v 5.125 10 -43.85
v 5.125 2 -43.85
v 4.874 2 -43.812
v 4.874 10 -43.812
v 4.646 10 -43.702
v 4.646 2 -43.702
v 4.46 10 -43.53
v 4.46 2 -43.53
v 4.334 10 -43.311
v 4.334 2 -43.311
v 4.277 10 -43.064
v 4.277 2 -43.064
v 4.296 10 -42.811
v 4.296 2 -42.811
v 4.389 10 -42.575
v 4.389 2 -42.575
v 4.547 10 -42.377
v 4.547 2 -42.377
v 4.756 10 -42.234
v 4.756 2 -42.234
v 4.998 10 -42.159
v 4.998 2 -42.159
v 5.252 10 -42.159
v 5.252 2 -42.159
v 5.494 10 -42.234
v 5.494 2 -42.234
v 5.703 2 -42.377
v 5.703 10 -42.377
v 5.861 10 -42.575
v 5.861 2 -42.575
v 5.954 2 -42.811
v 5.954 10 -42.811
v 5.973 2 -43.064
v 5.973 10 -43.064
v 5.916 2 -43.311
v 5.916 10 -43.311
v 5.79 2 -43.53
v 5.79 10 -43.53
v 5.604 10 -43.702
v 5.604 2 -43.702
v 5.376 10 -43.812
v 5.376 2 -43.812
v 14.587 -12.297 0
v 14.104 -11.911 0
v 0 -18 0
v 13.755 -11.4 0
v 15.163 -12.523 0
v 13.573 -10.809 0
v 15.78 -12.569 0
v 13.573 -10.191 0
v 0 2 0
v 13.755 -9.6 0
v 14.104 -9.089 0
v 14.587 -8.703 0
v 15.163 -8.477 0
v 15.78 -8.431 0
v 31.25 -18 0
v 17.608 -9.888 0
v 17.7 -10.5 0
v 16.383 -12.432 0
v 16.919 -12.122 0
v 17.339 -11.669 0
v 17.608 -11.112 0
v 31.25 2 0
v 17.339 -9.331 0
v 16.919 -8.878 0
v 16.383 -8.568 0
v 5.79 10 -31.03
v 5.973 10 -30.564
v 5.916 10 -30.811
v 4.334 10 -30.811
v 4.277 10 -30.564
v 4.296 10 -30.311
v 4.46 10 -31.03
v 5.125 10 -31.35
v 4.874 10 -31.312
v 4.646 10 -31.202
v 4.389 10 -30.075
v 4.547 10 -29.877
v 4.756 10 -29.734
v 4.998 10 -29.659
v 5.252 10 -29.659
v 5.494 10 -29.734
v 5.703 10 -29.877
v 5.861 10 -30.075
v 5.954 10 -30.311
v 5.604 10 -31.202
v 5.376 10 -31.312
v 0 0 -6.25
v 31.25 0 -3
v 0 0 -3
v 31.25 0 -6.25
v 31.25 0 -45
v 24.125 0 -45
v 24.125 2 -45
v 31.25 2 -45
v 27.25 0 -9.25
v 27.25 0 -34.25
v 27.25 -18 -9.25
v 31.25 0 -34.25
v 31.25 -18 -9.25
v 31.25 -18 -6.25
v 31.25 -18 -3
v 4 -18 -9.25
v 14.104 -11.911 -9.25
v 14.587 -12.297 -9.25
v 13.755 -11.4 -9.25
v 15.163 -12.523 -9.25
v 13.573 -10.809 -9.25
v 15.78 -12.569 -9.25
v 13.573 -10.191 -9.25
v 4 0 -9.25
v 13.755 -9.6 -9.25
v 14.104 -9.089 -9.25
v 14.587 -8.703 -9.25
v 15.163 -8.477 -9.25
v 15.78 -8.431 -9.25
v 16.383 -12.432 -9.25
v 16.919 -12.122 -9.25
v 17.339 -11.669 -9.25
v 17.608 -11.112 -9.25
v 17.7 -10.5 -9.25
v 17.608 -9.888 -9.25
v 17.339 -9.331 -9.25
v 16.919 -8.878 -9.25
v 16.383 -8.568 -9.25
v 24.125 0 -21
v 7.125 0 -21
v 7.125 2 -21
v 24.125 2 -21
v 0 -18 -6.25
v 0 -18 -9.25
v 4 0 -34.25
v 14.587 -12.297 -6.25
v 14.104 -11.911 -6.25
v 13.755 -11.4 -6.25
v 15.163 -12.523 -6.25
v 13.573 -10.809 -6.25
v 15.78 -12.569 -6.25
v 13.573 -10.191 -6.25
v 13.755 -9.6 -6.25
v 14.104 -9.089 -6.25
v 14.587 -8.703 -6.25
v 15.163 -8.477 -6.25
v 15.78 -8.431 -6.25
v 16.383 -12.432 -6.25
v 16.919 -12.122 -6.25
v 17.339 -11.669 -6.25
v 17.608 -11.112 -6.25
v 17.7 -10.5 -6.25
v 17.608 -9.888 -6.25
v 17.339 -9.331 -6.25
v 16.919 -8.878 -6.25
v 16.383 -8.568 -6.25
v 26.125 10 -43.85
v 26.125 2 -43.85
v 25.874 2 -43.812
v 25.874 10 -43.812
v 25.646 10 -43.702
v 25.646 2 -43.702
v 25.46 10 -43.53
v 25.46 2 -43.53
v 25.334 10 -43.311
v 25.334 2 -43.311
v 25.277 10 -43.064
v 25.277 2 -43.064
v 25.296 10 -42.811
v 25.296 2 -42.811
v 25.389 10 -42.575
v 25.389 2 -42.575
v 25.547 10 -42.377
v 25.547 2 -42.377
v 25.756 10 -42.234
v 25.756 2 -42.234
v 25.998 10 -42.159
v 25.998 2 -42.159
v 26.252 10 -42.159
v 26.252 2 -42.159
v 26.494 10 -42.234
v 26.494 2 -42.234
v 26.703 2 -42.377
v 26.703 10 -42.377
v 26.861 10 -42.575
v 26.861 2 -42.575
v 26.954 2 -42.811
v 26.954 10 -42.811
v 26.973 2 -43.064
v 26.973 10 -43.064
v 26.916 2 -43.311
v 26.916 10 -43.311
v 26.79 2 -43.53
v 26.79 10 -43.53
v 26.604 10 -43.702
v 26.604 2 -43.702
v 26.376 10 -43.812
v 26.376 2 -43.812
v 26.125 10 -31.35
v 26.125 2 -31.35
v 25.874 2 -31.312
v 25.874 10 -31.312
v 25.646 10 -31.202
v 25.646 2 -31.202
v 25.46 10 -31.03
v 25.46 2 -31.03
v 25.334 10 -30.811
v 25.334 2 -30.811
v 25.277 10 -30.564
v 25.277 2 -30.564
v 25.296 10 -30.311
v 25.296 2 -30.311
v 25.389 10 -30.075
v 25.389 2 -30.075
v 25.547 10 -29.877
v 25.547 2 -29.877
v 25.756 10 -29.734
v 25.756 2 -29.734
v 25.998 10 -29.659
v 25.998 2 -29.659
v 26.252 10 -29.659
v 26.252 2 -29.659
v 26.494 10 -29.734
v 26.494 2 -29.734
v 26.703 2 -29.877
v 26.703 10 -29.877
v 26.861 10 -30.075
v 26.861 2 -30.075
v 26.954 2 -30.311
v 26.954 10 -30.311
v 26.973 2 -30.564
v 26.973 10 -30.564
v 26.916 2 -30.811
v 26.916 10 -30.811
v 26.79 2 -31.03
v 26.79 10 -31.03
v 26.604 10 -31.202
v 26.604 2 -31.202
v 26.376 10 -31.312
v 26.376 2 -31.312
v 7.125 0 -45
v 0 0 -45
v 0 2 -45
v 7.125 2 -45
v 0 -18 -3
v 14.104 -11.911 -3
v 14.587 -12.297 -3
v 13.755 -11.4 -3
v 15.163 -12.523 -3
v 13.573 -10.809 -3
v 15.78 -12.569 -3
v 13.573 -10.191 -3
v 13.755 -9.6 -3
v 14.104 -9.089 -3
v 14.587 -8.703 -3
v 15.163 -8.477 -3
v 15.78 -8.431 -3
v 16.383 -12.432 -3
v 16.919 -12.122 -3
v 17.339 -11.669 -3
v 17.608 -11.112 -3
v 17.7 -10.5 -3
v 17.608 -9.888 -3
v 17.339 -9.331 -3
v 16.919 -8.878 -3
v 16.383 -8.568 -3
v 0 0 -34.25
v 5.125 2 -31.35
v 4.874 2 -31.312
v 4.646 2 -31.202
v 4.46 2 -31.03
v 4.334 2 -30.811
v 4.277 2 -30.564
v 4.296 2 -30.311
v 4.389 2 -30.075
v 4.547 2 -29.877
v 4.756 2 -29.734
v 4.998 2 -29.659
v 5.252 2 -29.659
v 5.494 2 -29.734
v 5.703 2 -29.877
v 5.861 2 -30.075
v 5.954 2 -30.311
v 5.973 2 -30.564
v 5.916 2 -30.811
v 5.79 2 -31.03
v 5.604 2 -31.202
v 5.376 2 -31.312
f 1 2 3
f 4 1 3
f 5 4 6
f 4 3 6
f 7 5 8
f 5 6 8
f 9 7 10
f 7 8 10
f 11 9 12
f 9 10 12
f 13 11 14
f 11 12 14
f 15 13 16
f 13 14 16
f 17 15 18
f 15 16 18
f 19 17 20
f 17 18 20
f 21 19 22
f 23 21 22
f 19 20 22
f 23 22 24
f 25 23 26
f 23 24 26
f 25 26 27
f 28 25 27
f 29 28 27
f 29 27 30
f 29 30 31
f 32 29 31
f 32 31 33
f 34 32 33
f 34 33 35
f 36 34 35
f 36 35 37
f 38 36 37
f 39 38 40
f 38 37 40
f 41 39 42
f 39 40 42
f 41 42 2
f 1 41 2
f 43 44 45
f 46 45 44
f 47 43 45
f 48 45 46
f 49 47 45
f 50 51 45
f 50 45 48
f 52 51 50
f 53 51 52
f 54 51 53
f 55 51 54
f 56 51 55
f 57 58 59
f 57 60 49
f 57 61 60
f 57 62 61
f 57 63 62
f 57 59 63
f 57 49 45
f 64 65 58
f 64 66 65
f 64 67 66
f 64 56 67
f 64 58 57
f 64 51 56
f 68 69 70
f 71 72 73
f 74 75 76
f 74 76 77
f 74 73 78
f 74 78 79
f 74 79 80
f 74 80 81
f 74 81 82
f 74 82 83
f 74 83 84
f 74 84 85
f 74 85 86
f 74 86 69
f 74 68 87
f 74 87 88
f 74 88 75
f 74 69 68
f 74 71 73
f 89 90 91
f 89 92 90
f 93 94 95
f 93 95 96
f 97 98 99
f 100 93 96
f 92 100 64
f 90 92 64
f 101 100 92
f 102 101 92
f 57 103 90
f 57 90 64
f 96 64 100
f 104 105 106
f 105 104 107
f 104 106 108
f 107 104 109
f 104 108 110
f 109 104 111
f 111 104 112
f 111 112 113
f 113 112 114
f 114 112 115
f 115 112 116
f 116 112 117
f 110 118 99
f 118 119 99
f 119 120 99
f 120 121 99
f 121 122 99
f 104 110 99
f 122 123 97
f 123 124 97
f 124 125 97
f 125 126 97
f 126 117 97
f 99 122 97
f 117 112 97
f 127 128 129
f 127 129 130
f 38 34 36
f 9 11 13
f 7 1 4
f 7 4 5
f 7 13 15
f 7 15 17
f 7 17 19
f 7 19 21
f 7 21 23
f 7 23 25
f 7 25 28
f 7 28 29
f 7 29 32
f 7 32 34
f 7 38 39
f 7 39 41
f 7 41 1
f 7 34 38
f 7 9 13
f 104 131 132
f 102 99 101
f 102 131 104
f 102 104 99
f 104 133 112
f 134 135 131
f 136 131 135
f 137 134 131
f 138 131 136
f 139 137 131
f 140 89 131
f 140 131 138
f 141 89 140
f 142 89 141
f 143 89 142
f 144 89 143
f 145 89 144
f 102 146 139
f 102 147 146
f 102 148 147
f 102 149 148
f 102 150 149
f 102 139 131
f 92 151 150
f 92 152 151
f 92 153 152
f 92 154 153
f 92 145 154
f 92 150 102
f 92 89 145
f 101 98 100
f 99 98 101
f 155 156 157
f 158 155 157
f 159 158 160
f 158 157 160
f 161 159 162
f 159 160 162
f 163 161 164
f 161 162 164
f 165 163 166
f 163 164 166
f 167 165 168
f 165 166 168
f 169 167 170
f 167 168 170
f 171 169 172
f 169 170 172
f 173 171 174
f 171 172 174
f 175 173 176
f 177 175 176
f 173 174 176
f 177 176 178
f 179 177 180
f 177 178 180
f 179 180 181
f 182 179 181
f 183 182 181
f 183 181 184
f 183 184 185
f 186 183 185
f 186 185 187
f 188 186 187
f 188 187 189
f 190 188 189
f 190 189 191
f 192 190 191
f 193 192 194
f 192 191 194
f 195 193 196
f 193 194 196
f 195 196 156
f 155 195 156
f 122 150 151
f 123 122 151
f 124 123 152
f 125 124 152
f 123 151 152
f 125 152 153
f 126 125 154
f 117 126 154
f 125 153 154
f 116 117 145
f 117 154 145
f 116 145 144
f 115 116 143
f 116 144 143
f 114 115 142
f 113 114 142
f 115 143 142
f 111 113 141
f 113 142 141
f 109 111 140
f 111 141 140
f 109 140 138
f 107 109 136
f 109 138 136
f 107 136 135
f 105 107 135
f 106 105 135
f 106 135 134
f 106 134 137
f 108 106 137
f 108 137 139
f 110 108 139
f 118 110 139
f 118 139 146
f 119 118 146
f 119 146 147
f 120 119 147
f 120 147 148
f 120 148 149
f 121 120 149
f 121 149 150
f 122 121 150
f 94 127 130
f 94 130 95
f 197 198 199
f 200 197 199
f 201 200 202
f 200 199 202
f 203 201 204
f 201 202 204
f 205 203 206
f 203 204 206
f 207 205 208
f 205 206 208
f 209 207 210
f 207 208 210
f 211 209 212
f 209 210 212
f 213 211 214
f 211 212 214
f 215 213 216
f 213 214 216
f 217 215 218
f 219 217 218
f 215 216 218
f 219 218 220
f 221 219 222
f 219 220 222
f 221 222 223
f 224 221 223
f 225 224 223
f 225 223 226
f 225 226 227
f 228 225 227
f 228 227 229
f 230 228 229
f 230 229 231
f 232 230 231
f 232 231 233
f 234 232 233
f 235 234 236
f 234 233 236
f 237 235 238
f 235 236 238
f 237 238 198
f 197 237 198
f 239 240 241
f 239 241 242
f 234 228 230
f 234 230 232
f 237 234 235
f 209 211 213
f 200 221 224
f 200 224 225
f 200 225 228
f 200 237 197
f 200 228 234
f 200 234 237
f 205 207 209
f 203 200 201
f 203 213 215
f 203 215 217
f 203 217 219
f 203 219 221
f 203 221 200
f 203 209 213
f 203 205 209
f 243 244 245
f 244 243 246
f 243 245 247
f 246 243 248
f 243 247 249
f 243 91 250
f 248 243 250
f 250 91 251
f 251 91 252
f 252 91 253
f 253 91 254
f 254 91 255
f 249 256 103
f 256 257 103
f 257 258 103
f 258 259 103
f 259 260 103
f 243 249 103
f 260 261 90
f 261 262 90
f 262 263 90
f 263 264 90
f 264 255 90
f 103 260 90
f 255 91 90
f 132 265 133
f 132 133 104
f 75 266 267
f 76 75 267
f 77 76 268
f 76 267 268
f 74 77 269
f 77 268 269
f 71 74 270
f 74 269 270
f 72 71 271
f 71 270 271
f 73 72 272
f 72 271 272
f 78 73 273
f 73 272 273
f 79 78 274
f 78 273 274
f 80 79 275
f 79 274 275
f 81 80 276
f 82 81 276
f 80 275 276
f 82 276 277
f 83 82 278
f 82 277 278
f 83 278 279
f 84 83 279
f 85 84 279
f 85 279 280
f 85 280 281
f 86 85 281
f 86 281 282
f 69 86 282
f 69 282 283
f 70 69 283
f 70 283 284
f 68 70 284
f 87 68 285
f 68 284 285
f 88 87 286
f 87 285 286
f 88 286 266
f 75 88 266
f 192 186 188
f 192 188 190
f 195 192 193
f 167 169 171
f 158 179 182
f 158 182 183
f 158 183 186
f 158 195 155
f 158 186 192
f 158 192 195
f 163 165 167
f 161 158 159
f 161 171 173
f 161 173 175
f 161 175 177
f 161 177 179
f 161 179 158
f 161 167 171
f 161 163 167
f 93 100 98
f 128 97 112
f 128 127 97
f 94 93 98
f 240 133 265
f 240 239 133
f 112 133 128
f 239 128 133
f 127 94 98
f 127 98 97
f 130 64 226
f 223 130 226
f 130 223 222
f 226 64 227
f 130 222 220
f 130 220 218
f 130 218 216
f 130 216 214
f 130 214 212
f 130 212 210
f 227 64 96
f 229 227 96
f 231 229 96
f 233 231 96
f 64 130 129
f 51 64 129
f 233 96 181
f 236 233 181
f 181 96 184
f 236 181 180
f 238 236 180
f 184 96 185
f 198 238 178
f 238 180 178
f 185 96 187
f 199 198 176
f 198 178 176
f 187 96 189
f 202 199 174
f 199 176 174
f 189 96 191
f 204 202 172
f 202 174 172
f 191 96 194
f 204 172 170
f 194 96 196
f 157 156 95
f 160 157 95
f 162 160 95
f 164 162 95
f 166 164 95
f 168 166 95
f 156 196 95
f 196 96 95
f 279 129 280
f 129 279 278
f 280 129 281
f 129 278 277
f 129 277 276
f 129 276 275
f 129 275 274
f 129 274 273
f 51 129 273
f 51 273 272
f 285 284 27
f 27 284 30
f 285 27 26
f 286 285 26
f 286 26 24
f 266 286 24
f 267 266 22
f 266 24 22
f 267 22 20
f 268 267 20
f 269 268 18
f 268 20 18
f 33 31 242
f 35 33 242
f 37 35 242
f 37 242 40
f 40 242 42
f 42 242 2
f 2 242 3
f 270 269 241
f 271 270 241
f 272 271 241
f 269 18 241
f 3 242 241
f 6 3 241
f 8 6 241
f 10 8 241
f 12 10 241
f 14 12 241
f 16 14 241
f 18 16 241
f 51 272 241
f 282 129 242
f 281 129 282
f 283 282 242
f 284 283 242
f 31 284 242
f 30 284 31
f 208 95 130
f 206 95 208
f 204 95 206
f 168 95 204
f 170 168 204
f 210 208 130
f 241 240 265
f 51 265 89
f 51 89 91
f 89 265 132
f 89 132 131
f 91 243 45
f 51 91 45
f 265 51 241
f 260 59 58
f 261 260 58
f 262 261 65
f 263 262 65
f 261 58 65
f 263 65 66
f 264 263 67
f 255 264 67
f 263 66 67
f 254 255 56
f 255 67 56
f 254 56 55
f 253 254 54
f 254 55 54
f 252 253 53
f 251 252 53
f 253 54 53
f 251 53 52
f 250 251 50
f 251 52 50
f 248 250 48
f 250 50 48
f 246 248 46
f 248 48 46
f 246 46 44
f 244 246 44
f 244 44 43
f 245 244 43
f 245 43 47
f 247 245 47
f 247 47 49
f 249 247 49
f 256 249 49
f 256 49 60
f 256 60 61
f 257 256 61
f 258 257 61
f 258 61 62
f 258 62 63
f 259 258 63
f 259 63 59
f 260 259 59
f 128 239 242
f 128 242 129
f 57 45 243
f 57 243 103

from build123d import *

# Parameters (mm, degrees)
BOSS_EXTRUDE1_DEPTH = 2
SKETCH3_R           = 0.85
BOSS_EXTRUDE2_DEPTH = 8
SKETCH4_W           = 31.25
SKETCH4_H           = 3
BOSS_EXTRUDE3_DEPTH = 18
SKETCH12_R          = 2.075
CUT_EXTRUDE2_DEPTH  = 58.667690261
RIB1_REACH          = 59.668
SKETCH13_WALL_W     = 148.141224122
SKETCH13_WALL_H     = 4
RIB2_REACH          = 59.668
SKETCH14_WALL_W     = 148.141224122
SKETCH14_WALL_H     = 4


with BuildPart() as part:
    # Sketch2 → Boss-Extrude1 (new body)
    with BuildSketch(Plane(origin=(0, 0, 0), x_dir=(1, 0, 0), z_dir=(0, 1, 0))):
        Polygon((0, 0), (0, 45), (7.125, 45), (7.125, 21), (24.125, 21), (24.125, 45), (31.25, 45), (31.25, 0), align=None)
    extrude(amount=BOSS_EXTRUDE1_DEPTH)

    # Sketch3 → Boss-Extrude2 (add)
    with BuildSketch(Plane(origin=(0, 2, 0), x_dir=(1, 0, 0), z_dir=(0, 1, 0))):
        with Locations(Location((5.125, 43, 0), (0, 0, 90))):
            Circle(SKETCH3_R)
        with Locations(Location((5.125, 30.5, 0), (0, 0, 90))):
            Circle(SKETCH3_R)
        with Locations(Location((26.125, 30.5, 0), (0, 0, 90))):
            Circle(SKETCH3_R)
        with Locations(Location((26.125, 43, 0), (0, 0, 90))):
            Circle(SKETCH3_R)
    extrude(amount=BOSS_EXTRUDE2_DEPTH)

    # Sketch4 → Boss-Extrude3 (add)
    with BuildSketch(Plane.XZ):
        with Locations((15.625, -1.5)):
            Rectangle(SKETCH4_W, SKETCH4_H)
        with Locations((15.625, -7.75)):
            Rectangle(SKETCH4_W, SKETCH4_H)
    extrude(amount=BOSS_EXTRUDE3_DEPTH)

    # Sketch12 → Cut-Extrude2 (cut, through all)
    with BuildSketch(Plane.XY):
        with Locations((15.625, -10.5)):
            Circle(SKETCH12_R)
    extrude(amount=-CUT_EXTRUDE2_DEPTH, mode=Mode.SUBTRACT)

    # Sketch13 wall → Rib1 (add, up to next)
    with BuildSketch(Plane(origin=(0, -9, -21.75), x_dir=(0, -0.584304725845, 0.811534341451), z_dir=(0, -0.811534341451, -0.584304725845)), mode=Mode.PRIVATE) as rib1_sk1:
        with Locations((0, -2)):
            Rectangle(SKETCH13_WALL_W, SKETCH13_WALL_H)
    rib1_tool1 = extrude(rib1_sk1.sketch, amount=-RIB1_REACH, mode=Mode.PRIVATE) - part.part
    add(rib1_tool1.solids().sort_by_distance((0, -9, -21.75))[0])

    # Sketch14 wall → Rib2 (add, up to next)
    with BuildSketch(Plane(origin=(31.25, -9, -21.75), x_dir=(0, -0.584304725845, 0.811534341451), z_dir=(0, -0.811534341451, -0.584304725845)), mode=Mode.PRIVATE) as rib2_sk1:
        with Locations((0, 2)):
            Rectangle(SKETCH14_WALL_W, SKETCH14_WALL_H)
    rib2_tool1 = extrude(rib2_sk1.sketch, amount=-RIB2_REACH, mode=Mode.PRIVATE) - part.part
    add(rib2_tool1.solids().sort_by_distance((31.25, -9, -21.75))[0])


solid = part.part
